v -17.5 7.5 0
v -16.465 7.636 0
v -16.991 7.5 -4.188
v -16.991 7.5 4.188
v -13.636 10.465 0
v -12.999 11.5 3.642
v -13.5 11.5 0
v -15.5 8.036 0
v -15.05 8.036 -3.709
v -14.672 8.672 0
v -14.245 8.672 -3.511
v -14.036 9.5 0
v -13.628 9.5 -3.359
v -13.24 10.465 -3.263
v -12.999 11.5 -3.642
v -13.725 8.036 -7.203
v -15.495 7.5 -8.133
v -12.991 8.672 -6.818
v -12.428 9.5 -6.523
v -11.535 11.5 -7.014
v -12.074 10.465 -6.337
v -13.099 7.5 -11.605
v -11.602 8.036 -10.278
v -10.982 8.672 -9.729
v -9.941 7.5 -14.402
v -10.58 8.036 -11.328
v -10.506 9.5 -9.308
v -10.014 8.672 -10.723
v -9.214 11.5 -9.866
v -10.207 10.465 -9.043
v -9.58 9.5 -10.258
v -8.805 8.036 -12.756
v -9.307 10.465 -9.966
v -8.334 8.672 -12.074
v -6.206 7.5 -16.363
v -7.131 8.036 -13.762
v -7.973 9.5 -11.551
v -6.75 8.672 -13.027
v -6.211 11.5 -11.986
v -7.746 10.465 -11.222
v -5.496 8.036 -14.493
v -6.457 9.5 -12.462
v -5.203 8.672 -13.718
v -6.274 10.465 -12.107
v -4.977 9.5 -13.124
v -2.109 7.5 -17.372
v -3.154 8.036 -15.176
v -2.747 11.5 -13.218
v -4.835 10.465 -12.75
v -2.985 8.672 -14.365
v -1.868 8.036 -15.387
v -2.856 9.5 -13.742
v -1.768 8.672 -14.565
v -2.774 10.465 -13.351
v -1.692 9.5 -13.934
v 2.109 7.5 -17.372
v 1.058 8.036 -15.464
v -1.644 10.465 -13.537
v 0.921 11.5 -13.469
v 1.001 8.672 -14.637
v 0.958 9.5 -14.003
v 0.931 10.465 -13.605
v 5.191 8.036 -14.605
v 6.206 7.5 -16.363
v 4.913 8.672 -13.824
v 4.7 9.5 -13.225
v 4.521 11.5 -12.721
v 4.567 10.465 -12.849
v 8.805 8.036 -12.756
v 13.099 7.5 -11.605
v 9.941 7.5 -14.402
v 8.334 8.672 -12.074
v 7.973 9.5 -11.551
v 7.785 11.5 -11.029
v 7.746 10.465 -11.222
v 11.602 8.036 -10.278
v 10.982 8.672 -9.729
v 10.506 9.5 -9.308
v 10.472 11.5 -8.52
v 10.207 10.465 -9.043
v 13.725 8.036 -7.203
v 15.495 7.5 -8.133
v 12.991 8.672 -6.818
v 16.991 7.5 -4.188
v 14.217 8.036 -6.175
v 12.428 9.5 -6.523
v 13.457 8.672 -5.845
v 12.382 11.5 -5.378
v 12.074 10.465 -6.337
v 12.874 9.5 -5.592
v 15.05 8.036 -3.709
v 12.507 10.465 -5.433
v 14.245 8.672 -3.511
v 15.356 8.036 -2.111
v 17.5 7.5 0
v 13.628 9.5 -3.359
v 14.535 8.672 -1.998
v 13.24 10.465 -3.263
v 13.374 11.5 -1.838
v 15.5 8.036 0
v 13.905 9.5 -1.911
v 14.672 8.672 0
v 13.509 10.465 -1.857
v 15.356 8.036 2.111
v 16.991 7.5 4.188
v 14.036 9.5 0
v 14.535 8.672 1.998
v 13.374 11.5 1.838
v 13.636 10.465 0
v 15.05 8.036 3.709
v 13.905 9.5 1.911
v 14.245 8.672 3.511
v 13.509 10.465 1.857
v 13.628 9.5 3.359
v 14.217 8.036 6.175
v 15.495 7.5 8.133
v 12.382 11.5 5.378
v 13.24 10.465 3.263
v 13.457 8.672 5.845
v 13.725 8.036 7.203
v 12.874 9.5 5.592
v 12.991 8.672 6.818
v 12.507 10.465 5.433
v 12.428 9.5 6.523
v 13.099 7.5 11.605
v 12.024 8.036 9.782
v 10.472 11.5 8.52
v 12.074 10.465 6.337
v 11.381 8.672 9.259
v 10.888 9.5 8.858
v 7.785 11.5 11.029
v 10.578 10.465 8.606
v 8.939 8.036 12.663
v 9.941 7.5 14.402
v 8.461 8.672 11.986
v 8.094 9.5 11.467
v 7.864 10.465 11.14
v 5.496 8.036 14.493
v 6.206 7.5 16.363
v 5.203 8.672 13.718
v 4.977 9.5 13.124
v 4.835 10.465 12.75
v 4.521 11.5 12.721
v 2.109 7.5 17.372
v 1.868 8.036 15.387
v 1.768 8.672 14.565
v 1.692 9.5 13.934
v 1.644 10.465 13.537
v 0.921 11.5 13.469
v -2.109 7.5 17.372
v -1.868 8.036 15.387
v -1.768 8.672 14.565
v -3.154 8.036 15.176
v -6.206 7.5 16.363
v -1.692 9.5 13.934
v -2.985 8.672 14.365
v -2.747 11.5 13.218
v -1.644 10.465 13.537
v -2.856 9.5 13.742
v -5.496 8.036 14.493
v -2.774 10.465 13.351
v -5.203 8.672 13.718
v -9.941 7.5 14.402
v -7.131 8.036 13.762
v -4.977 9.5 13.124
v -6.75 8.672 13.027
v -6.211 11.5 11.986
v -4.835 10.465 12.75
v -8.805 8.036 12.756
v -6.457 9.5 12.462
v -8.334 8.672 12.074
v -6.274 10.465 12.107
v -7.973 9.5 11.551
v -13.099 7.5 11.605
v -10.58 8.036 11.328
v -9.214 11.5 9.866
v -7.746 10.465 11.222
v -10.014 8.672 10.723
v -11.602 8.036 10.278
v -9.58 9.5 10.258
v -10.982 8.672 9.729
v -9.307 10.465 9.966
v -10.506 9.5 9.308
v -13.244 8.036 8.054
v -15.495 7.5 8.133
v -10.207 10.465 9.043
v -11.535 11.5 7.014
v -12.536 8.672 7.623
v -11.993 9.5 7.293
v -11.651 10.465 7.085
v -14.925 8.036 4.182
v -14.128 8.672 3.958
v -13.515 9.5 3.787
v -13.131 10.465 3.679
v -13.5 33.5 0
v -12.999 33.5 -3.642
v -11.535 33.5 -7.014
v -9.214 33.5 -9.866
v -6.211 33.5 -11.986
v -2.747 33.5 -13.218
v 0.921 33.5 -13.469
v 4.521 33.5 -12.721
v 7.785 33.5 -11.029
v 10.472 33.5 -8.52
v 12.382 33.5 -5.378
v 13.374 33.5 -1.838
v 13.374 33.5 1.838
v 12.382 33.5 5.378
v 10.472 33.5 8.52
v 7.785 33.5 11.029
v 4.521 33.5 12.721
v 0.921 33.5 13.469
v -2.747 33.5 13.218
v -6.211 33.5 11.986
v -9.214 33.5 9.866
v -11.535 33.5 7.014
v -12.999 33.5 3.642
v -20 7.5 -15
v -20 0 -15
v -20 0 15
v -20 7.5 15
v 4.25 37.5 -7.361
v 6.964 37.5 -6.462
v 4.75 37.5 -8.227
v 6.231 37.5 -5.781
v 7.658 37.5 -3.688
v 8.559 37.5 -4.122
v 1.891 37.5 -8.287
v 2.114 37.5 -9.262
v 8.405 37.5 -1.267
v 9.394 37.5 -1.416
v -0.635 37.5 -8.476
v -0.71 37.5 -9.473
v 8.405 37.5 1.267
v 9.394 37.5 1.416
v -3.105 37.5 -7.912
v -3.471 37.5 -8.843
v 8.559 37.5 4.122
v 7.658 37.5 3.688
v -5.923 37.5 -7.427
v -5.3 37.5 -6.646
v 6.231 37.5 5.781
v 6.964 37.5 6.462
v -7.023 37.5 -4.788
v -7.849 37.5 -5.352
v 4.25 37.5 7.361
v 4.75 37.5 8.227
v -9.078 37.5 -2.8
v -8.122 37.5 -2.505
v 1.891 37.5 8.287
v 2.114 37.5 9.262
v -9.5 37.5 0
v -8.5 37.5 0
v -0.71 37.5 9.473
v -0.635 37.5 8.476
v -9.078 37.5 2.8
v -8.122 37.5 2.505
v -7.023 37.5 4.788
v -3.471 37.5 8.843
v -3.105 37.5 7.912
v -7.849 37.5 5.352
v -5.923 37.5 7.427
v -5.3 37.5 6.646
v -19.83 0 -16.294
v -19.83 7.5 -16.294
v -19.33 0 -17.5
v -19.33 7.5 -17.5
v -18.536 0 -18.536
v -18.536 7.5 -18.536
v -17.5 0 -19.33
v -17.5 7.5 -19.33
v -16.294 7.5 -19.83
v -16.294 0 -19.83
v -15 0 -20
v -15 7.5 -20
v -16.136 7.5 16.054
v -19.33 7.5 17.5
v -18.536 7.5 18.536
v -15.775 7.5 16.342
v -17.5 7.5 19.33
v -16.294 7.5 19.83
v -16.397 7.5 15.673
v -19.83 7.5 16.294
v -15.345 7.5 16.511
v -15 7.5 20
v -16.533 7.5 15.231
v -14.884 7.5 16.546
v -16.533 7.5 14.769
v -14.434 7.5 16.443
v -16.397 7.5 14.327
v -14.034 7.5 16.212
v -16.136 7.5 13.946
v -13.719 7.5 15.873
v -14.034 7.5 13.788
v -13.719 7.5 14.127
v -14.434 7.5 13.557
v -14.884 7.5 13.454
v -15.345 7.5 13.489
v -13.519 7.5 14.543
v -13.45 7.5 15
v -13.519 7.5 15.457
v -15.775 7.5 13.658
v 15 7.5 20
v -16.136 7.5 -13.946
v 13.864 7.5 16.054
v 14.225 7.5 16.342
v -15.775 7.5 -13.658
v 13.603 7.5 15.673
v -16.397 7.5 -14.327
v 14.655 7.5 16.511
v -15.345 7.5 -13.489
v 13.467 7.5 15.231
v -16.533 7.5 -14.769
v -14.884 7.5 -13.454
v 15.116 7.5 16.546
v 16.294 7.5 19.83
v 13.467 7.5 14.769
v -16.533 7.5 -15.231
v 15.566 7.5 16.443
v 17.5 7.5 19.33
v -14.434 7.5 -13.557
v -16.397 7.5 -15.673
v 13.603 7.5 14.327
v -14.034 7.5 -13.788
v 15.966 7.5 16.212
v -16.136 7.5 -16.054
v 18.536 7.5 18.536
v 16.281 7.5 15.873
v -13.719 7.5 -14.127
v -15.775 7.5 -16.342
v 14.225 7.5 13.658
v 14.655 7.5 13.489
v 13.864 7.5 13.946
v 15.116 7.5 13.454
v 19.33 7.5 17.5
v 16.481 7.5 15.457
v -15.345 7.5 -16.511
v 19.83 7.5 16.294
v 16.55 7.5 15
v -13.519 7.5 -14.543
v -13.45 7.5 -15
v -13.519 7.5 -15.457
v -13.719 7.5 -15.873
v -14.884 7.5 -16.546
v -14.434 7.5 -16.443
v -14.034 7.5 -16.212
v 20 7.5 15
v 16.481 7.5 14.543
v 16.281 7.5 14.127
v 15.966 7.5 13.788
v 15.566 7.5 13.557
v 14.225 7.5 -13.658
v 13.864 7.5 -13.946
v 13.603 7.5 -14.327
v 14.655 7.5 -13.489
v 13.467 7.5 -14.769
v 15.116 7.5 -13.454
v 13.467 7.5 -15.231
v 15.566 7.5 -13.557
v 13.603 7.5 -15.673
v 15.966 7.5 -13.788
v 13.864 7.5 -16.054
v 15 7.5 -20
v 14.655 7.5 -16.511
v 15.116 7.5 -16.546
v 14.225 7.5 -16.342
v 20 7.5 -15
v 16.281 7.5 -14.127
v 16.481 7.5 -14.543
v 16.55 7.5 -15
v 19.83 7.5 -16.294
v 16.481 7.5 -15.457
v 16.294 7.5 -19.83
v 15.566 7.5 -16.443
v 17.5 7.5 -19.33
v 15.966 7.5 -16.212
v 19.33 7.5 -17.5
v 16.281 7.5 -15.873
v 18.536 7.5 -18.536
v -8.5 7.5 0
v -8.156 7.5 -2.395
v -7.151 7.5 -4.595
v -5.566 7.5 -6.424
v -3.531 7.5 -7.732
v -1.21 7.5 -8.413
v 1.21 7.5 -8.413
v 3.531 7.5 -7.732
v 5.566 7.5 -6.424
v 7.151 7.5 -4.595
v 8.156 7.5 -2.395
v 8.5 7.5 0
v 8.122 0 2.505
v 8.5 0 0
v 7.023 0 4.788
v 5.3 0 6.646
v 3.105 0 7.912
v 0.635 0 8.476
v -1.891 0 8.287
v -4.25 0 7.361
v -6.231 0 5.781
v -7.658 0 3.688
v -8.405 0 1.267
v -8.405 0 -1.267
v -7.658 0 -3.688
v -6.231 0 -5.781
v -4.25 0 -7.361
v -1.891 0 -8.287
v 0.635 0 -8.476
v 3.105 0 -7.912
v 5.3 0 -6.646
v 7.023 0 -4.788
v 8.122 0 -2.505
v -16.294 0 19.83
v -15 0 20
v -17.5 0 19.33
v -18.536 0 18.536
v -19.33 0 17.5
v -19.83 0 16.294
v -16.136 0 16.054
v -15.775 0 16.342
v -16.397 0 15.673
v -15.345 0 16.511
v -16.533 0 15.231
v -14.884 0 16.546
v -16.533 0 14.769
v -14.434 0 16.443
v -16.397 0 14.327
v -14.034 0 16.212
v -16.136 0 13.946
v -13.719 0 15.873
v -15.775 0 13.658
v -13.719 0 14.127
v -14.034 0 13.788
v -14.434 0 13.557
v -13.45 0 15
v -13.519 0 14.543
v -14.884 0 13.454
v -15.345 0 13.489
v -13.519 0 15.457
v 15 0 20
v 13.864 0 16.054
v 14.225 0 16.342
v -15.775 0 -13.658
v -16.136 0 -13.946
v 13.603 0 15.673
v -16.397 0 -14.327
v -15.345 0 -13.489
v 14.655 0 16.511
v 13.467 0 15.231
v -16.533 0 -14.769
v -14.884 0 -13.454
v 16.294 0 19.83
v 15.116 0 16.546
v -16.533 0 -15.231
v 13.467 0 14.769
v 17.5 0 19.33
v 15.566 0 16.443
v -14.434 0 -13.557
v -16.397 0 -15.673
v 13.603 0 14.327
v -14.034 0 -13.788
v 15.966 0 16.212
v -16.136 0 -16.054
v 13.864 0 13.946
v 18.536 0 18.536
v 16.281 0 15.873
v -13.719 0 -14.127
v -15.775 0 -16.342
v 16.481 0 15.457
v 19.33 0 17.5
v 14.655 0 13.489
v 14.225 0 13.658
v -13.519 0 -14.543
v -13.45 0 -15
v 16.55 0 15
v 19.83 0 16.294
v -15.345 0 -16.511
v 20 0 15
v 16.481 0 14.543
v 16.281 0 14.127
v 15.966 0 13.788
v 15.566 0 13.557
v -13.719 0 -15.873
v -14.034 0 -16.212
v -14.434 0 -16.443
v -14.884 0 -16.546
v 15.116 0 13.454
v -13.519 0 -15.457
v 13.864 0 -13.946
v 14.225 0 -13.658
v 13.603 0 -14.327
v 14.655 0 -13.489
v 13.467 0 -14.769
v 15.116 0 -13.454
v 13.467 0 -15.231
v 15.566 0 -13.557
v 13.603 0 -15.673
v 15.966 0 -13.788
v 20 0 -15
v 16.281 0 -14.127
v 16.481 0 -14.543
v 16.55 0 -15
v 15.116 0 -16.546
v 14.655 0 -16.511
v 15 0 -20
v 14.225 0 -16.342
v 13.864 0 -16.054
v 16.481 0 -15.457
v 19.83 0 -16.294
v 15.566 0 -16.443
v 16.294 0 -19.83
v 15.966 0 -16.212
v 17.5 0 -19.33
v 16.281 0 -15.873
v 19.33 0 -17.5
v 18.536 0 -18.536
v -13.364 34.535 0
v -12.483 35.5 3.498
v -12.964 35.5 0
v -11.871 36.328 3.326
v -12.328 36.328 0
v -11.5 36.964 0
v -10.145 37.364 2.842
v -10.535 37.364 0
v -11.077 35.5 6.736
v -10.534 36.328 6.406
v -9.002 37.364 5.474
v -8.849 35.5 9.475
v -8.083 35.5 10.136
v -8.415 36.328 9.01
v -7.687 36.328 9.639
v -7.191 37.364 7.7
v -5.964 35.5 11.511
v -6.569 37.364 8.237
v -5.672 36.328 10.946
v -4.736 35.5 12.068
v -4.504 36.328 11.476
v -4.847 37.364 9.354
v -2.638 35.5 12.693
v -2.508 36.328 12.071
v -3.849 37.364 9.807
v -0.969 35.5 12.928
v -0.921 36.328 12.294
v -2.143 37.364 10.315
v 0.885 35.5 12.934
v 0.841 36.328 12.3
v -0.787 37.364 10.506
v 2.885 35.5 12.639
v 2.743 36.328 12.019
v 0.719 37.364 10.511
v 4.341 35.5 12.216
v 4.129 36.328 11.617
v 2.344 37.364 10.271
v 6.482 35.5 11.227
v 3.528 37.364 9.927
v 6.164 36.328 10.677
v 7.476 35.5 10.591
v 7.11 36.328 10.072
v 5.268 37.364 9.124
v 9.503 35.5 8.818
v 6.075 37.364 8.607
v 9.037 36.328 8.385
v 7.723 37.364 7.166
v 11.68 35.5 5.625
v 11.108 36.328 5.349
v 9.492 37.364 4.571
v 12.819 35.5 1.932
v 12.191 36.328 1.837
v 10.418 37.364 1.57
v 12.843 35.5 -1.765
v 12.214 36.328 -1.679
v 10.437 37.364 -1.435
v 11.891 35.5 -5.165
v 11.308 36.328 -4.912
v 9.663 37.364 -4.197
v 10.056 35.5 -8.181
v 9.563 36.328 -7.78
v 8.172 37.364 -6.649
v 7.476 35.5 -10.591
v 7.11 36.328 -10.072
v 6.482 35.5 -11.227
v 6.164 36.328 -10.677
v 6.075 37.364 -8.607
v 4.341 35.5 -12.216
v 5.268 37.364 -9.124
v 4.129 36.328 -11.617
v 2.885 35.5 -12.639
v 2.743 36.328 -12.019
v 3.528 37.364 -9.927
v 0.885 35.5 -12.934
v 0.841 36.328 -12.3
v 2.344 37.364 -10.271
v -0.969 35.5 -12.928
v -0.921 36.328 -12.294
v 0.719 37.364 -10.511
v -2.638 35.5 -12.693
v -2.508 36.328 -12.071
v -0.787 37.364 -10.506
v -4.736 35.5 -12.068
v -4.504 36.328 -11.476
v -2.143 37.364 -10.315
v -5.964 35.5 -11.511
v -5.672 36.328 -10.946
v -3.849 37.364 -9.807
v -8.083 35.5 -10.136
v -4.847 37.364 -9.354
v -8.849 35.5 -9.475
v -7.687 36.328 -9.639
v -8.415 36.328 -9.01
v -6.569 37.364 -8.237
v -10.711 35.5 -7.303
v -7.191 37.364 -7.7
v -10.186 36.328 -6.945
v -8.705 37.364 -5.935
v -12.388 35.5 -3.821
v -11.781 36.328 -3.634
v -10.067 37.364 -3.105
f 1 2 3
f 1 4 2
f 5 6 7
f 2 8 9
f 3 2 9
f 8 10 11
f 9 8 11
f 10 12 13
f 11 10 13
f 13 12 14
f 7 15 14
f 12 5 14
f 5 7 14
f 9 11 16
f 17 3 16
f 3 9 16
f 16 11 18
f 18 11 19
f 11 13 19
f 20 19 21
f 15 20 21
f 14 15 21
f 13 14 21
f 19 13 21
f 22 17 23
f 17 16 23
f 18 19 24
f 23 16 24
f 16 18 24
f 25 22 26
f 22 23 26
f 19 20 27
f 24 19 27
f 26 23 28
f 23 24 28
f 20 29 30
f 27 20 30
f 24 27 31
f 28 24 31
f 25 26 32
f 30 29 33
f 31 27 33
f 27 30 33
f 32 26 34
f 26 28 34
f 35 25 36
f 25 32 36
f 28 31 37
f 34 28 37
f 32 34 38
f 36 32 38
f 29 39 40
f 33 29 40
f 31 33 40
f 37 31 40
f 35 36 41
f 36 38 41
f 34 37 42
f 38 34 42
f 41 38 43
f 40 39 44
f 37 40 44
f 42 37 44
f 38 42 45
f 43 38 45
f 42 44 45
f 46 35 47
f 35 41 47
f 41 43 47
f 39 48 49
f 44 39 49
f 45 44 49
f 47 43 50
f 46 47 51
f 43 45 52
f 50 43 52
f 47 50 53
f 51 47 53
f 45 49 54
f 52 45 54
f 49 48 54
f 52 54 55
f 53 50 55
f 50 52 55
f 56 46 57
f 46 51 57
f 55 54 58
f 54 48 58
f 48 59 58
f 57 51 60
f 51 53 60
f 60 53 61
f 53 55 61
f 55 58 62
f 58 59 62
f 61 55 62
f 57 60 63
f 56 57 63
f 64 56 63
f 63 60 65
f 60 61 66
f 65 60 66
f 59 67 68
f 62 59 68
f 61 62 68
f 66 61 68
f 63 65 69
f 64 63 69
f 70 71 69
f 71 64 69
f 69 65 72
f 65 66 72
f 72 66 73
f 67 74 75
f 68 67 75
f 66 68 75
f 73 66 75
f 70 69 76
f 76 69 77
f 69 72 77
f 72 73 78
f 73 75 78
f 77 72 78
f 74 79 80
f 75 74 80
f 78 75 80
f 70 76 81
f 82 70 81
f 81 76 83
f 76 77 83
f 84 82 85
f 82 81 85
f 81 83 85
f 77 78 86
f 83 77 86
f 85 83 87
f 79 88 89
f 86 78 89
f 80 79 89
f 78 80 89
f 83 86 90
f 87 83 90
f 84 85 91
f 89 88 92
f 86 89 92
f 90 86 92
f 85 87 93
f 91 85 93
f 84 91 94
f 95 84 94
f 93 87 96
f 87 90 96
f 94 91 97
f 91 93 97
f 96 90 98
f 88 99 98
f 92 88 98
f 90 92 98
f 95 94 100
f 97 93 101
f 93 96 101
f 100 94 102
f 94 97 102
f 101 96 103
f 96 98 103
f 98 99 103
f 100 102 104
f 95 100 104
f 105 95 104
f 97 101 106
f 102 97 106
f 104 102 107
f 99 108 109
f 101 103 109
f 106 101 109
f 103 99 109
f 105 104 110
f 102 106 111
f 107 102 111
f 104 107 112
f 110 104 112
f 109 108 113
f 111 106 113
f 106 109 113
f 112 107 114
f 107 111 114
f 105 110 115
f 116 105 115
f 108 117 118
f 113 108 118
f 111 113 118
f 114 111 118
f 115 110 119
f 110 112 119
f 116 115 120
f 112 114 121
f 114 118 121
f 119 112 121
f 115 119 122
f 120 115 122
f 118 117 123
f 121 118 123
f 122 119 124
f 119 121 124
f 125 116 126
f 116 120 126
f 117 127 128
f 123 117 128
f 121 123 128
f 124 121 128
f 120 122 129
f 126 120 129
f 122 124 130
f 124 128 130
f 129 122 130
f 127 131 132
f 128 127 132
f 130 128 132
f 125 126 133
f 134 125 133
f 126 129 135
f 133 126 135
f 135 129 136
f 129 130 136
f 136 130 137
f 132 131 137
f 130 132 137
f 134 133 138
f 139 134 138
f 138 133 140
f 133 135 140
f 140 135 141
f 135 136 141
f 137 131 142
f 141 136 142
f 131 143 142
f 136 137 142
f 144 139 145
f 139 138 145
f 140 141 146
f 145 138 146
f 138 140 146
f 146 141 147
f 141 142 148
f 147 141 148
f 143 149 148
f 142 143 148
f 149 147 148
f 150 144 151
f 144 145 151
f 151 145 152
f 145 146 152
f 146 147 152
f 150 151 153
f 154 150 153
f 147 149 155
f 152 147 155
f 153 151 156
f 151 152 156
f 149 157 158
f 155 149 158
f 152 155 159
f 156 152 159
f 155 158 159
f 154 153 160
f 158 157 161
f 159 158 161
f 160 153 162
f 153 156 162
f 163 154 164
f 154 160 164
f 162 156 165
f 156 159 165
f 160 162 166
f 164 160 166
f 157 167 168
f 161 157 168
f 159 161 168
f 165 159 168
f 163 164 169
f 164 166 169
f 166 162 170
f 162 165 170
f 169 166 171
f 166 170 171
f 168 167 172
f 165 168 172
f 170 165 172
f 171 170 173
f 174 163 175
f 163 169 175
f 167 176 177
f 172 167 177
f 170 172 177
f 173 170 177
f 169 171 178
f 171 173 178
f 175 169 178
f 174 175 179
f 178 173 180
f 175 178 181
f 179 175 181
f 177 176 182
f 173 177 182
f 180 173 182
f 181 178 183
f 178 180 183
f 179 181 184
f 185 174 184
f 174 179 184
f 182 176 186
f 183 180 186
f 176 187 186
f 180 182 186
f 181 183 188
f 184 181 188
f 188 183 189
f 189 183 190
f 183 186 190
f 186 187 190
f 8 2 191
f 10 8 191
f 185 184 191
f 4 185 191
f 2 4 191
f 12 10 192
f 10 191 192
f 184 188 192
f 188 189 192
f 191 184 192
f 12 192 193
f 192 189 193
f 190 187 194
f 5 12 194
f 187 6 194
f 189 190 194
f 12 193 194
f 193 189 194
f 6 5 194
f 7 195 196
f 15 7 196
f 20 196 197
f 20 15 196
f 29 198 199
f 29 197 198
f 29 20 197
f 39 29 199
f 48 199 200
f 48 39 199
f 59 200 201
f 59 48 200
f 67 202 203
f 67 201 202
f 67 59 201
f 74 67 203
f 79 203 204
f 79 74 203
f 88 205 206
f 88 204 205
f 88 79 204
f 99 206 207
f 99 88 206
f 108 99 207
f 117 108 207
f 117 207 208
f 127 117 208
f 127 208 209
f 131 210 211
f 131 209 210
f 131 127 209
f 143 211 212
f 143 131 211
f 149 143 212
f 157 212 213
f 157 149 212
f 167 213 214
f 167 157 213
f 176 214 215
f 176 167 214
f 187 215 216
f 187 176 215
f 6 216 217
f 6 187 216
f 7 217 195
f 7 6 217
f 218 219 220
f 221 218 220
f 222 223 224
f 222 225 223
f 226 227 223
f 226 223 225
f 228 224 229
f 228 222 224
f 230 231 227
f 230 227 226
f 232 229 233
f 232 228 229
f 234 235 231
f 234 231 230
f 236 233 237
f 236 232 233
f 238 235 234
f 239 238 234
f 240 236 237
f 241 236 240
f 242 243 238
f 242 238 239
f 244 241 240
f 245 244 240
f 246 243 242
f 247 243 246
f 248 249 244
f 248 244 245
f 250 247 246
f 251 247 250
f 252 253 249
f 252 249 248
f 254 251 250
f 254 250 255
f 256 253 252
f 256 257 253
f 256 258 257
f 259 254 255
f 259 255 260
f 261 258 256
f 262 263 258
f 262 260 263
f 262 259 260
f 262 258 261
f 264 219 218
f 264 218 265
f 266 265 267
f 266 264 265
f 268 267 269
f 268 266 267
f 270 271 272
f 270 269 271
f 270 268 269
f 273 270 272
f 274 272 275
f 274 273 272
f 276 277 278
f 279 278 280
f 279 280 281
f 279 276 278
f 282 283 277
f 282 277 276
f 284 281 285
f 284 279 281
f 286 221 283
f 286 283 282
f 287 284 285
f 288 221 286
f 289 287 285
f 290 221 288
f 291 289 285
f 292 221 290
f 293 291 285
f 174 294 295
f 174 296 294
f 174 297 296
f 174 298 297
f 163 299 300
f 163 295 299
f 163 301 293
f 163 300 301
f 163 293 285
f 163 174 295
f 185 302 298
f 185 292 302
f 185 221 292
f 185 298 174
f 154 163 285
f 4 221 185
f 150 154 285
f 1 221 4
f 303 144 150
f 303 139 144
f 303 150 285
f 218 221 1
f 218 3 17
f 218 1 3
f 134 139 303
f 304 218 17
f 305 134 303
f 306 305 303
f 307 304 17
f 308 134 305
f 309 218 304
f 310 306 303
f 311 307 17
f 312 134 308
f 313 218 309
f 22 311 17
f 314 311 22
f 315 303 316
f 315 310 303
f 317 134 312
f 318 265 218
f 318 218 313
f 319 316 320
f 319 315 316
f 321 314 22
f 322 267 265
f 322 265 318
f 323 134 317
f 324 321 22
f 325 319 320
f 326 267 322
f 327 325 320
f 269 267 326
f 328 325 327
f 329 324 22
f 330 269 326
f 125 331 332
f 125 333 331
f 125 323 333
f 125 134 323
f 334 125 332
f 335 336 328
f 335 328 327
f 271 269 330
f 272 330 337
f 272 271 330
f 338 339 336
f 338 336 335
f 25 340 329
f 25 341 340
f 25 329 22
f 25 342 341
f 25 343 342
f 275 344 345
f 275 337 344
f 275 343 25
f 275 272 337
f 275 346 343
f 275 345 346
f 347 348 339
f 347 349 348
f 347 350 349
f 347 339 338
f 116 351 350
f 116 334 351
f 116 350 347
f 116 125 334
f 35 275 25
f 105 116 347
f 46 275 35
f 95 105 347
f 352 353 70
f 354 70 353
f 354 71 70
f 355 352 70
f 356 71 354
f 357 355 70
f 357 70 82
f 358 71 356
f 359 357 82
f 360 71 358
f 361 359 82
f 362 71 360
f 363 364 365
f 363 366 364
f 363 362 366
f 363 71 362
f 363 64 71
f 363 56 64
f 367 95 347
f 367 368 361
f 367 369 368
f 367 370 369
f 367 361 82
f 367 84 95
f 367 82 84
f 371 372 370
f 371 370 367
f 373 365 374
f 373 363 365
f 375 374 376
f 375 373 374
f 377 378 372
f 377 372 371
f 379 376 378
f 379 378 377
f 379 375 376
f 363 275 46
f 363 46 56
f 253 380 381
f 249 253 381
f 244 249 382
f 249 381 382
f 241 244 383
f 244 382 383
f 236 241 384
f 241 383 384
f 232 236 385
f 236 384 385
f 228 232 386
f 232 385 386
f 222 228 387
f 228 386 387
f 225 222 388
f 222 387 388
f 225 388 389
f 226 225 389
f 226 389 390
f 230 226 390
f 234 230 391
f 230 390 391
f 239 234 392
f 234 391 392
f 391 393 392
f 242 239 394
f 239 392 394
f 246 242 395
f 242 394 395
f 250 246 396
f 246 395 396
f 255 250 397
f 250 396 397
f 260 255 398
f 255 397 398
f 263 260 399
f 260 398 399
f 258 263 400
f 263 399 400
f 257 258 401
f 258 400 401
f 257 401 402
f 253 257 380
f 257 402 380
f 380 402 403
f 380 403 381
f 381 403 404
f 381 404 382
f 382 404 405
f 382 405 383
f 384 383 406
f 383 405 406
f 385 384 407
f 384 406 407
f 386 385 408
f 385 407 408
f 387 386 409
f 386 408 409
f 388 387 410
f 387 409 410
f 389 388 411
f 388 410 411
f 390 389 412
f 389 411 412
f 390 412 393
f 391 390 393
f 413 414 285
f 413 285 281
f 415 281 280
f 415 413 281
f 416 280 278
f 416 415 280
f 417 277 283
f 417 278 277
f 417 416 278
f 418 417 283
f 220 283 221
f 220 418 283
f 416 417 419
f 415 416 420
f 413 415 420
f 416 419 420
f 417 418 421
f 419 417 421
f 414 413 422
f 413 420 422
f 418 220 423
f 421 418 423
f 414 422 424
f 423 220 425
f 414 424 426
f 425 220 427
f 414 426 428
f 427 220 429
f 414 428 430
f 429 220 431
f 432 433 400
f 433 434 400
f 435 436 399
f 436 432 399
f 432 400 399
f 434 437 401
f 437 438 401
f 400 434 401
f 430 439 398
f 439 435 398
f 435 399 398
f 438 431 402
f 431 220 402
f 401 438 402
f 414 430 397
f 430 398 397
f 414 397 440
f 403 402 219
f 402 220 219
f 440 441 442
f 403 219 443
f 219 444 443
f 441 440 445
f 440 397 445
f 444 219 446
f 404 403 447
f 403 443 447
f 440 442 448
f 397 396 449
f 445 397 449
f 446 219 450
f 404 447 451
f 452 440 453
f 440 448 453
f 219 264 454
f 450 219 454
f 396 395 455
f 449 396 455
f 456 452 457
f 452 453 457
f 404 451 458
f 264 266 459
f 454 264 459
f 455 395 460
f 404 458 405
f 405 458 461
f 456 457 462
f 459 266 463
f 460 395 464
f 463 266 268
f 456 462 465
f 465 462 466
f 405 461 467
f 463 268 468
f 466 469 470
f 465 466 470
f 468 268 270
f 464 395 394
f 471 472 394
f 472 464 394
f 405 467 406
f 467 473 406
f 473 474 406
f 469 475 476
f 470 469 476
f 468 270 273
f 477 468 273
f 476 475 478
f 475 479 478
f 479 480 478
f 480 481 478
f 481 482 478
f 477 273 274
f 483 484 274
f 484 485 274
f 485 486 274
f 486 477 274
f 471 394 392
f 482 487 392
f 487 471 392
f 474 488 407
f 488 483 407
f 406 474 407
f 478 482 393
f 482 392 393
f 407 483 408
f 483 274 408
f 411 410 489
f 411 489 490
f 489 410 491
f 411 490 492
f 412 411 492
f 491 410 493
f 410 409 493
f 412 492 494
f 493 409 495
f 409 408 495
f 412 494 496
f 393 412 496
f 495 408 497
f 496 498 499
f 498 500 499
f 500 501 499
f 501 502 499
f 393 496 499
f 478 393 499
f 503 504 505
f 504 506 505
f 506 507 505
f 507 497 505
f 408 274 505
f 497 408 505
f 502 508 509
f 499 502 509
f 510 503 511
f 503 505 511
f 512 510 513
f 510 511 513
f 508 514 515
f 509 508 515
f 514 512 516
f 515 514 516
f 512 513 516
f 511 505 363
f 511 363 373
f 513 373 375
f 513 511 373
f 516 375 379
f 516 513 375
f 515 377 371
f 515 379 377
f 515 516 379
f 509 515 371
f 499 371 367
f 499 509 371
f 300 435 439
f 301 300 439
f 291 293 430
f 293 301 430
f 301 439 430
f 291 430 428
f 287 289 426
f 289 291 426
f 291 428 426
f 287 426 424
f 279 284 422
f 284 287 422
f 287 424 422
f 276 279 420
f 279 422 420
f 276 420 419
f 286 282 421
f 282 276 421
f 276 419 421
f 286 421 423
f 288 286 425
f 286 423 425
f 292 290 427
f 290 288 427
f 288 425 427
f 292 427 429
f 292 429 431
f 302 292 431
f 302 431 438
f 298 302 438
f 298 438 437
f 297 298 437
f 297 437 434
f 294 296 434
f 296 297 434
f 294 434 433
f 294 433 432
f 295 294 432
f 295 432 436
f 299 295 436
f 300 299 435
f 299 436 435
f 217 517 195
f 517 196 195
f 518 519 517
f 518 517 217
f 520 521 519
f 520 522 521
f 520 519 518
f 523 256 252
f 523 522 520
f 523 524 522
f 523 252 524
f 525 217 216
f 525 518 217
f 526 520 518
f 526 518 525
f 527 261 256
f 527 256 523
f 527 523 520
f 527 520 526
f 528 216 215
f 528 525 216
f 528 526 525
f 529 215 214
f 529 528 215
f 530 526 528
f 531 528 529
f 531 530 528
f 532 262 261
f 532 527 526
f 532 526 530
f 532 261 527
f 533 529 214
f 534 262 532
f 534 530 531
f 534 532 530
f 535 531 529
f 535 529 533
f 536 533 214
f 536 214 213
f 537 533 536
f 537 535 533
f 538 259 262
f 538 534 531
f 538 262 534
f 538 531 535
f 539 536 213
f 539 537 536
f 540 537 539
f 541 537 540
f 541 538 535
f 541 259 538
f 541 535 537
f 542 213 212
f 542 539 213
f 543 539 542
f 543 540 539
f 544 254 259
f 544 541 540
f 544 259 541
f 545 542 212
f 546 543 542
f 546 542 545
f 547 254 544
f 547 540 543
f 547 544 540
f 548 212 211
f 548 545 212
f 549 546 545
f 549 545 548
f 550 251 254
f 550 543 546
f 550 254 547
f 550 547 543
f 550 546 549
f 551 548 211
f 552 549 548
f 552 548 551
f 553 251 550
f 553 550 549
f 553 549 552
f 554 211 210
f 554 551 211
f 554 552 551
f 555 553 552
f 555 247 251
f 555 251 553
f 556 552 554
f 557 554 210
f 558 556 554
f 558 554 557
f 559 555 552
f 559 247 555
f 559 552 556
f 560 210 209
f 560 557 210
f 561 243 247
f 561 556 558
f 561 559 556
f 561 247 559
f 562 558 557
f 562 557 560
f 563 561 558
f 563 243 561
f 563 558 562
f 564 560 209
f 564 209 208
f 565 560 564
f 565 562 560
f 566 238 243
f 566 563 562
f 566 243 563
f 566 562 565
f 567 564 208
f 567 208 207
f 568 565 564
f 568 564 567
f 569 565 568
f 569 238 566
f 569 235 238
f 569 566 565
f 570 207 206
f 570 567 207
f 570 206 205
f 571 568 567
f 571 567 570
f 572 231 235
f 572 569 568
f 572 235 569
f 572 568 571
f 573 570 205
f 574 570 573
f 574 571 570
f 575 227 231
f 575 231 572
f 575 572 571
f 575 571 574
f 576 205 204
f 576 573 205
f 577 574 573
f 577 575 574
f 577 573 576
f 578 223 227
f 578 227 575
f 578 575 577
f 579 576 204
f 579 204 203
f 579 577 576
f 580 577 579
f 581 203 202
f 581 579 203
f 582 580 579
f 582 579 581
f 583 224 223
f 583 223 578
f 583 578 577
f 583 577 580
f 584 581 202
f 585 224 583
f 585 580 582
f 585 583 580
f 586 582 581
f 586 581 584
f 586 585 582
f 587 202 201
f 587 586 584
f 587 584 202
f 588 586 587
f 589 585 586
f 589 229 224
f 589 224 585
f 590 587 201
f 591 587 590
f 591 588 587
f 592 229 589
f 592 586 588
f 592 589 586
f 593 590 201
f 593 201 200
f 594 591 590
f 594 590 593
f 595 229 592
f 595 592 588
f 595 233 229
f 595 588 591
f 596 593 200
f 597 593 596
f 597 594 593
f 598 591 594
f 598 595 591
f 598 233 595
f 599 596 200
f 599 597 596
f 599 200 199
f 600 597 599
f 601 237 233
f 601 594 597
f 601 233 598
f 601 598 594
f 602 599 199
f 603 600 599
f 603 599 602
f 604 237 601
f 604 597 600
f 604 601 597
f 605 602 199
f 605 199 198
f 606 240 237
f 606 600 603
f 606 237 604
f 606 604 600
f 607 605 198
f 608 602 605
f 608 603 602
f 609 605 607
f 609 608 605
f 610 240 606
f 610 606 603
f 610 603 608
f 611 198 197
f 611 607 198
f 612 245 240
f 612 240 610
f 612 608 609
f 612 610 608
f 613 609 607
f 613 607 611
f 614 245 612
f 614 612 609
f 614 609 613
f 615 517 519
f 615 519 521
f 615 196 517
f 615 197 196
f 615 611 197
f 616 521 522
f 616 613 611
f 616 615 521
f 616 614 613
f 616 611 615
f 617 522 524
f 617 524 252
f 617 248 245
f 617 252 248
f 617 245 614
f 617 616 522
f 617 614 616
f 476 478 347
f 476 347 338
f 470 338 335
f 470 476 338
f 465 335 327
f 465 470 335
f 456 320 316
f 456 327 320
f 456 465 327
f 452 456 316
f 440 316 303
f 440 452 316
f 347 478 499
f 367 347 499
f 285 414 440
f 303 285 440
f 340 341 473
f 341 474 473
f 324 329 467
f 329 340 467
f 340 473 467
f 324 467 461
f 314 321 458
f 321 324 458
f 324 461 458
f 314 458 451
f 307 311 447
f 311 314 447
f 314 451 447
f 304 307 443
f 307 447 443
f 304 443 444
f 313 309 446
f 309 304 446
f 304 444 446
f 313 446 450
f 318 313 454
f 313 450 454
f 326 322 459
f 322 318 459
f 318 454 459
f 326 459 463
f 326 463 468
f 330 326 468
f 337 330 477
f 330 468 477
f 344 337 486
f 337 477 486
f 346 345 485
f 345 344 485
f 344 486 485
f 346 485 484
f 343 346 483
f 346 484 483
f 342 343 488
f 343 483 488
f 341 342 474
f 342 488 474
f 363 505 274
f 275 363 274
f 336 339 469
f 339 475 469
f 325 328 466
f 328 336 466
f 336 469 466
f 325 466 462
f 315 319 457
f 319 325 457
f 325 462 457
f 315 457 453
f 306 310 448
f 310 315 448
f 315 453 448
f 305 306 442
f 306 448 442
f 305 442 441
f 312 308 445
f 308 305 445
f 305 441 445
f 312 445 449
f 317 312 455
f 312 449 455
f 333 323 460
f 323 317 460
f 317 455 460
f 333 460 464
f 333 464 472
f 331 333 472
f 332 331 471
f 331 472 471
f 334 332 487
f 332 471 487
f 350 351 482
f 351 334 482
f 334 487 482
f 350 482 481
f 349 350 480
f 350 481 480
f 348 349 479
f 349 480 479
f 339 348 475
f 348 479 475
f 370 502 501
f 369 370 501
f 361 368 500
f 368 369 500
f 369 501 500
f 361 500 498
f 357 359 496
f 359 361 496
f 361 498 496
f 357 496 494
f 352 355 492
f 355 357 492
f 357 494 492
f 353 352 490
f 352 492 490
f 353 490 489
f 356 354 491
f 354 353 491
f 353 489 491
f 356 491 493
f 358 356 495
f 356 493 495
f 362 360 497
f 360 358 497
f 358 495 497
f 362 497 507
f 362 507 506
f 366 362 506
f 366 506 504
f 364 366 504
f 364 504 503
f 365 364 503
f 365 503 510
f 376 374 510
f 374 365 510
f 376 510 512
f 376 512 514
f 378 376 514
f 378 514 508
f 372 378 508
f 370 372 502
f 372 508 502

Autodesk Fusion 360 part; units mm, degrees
sketch "Sketch1" plane through (0, 0, 0) normal (0, 1, 0) x (1, 0, 0)
  line L0 (15, 20) -> (-15, 20)
  line L1 (-20, 15) -> (-20, -15)
  line L2 (-15, -20) -> (15, -20)
  line L3 (20, -15) -> (20, 15)
  line L4 (20, 20) -> (-20, -20) construction
  line L5 (-20, 20) -> (20, -20) construction
  arc A0 (20, 15) -> (15, 20) centre (15, 15) ccw
  arc A1 (-20, -15) -> (-15, -20) centre (-15, -15) ccw
  arc A2 (15, -20) -> (20, -15) centre (15, -15) ccw
  arc A3 (-15, 20) -> (-20, 15) centre (-15, 15) ccw
  circle A4 centre (-15, 15) radius 1.55
  circle A5 centre (15, 15) radius 1.55
  circle A6 centre (15, -15) radius 1.55
  circle A7 centre (-15, -15) radius 1.55
  circle A8 centre (0, 0) radius 8.5
  dimension "d1" = 40
  dimension "d2" = 5
  dimension "d4" = 3.1
  dimension "d5" = 17
extrude "Extrude1" add sketch "Sketch1" along normal blind 7.5
sketch "Sketch2" plane through (0, 7.5, 0) normal (0, 1, 0) x (-1, 0, 0)
  circle A0 centre (15, -15) radius 1.55
  circle A1 centre (-15, -15) radius 1.55
  circle A2 centre (-15, 15) radius 1.55
  circle A3 centre (15, 15) radius 1.55
  circle A4 centre (0, 0) radius 8.5
  arc A5 (15, -20) -> (20, -15) centre (15, -15) ccw
  line L0 (20, -15) -> (20, 15)
  arc A6 (20, 15) -> (15, 20) centre (15, 15) ccw
  line L1 (15, 20) -> (-15, 20)
  arc A7 (-15, 20) -> (-20, 15) centre (-15, 15) ccw
  line L2 (-20, 15) -> (-20, -15)
  arc A8 (-20, -15) -> (-15, -20) centre (-15, -15) ccw
  line L3 (-15, -20) -> (15, -20)
  circle A9 centre (0, 0) radius 8.5
  circle A10 centre (0, 0) radius 13.5
  dimension "d8" = 5
extrude "Extrude2" add sketch "Sketch2" along normal blind 30 contours A10
fillet "Fillet1" radius 4 1 faces at (-13.4329, 27.5, -1.3442)
sketch "Sketch3" plane through (0, 7.5, 0) normal (0, 1, 0) x (-1, 0, 0)
  arc A0 (15, -20) -> (20, -15) centre (15, -15) ccw
  line L0 (20, -15) -> (20, 15)
  arc A1 (20, 15) -> (15, 20) centre (15, 15) ccw
  line L1 (15, 20) -> (-15, 20)
  arc A2 (-15, 20) -> (-20, 15) centre (-15, 15) ccw
  line L2 (-20, 15) -> (-20, -15)
  arc A3 (-20, -15) -> (-15, -20) centre (-15, -15) ccw
  line L3 (-15, -20) -> (15, -20)
  circle A4 centre (15, 15) radius 1.55
  circle A5 centre (-15, -15) radius 1.55
  circle A6 centre (15, -15) radius 1.55
  circle A7 centre (-15, 15) radius 1.55
  circle A8 centre (0, 0) radius 17.5
